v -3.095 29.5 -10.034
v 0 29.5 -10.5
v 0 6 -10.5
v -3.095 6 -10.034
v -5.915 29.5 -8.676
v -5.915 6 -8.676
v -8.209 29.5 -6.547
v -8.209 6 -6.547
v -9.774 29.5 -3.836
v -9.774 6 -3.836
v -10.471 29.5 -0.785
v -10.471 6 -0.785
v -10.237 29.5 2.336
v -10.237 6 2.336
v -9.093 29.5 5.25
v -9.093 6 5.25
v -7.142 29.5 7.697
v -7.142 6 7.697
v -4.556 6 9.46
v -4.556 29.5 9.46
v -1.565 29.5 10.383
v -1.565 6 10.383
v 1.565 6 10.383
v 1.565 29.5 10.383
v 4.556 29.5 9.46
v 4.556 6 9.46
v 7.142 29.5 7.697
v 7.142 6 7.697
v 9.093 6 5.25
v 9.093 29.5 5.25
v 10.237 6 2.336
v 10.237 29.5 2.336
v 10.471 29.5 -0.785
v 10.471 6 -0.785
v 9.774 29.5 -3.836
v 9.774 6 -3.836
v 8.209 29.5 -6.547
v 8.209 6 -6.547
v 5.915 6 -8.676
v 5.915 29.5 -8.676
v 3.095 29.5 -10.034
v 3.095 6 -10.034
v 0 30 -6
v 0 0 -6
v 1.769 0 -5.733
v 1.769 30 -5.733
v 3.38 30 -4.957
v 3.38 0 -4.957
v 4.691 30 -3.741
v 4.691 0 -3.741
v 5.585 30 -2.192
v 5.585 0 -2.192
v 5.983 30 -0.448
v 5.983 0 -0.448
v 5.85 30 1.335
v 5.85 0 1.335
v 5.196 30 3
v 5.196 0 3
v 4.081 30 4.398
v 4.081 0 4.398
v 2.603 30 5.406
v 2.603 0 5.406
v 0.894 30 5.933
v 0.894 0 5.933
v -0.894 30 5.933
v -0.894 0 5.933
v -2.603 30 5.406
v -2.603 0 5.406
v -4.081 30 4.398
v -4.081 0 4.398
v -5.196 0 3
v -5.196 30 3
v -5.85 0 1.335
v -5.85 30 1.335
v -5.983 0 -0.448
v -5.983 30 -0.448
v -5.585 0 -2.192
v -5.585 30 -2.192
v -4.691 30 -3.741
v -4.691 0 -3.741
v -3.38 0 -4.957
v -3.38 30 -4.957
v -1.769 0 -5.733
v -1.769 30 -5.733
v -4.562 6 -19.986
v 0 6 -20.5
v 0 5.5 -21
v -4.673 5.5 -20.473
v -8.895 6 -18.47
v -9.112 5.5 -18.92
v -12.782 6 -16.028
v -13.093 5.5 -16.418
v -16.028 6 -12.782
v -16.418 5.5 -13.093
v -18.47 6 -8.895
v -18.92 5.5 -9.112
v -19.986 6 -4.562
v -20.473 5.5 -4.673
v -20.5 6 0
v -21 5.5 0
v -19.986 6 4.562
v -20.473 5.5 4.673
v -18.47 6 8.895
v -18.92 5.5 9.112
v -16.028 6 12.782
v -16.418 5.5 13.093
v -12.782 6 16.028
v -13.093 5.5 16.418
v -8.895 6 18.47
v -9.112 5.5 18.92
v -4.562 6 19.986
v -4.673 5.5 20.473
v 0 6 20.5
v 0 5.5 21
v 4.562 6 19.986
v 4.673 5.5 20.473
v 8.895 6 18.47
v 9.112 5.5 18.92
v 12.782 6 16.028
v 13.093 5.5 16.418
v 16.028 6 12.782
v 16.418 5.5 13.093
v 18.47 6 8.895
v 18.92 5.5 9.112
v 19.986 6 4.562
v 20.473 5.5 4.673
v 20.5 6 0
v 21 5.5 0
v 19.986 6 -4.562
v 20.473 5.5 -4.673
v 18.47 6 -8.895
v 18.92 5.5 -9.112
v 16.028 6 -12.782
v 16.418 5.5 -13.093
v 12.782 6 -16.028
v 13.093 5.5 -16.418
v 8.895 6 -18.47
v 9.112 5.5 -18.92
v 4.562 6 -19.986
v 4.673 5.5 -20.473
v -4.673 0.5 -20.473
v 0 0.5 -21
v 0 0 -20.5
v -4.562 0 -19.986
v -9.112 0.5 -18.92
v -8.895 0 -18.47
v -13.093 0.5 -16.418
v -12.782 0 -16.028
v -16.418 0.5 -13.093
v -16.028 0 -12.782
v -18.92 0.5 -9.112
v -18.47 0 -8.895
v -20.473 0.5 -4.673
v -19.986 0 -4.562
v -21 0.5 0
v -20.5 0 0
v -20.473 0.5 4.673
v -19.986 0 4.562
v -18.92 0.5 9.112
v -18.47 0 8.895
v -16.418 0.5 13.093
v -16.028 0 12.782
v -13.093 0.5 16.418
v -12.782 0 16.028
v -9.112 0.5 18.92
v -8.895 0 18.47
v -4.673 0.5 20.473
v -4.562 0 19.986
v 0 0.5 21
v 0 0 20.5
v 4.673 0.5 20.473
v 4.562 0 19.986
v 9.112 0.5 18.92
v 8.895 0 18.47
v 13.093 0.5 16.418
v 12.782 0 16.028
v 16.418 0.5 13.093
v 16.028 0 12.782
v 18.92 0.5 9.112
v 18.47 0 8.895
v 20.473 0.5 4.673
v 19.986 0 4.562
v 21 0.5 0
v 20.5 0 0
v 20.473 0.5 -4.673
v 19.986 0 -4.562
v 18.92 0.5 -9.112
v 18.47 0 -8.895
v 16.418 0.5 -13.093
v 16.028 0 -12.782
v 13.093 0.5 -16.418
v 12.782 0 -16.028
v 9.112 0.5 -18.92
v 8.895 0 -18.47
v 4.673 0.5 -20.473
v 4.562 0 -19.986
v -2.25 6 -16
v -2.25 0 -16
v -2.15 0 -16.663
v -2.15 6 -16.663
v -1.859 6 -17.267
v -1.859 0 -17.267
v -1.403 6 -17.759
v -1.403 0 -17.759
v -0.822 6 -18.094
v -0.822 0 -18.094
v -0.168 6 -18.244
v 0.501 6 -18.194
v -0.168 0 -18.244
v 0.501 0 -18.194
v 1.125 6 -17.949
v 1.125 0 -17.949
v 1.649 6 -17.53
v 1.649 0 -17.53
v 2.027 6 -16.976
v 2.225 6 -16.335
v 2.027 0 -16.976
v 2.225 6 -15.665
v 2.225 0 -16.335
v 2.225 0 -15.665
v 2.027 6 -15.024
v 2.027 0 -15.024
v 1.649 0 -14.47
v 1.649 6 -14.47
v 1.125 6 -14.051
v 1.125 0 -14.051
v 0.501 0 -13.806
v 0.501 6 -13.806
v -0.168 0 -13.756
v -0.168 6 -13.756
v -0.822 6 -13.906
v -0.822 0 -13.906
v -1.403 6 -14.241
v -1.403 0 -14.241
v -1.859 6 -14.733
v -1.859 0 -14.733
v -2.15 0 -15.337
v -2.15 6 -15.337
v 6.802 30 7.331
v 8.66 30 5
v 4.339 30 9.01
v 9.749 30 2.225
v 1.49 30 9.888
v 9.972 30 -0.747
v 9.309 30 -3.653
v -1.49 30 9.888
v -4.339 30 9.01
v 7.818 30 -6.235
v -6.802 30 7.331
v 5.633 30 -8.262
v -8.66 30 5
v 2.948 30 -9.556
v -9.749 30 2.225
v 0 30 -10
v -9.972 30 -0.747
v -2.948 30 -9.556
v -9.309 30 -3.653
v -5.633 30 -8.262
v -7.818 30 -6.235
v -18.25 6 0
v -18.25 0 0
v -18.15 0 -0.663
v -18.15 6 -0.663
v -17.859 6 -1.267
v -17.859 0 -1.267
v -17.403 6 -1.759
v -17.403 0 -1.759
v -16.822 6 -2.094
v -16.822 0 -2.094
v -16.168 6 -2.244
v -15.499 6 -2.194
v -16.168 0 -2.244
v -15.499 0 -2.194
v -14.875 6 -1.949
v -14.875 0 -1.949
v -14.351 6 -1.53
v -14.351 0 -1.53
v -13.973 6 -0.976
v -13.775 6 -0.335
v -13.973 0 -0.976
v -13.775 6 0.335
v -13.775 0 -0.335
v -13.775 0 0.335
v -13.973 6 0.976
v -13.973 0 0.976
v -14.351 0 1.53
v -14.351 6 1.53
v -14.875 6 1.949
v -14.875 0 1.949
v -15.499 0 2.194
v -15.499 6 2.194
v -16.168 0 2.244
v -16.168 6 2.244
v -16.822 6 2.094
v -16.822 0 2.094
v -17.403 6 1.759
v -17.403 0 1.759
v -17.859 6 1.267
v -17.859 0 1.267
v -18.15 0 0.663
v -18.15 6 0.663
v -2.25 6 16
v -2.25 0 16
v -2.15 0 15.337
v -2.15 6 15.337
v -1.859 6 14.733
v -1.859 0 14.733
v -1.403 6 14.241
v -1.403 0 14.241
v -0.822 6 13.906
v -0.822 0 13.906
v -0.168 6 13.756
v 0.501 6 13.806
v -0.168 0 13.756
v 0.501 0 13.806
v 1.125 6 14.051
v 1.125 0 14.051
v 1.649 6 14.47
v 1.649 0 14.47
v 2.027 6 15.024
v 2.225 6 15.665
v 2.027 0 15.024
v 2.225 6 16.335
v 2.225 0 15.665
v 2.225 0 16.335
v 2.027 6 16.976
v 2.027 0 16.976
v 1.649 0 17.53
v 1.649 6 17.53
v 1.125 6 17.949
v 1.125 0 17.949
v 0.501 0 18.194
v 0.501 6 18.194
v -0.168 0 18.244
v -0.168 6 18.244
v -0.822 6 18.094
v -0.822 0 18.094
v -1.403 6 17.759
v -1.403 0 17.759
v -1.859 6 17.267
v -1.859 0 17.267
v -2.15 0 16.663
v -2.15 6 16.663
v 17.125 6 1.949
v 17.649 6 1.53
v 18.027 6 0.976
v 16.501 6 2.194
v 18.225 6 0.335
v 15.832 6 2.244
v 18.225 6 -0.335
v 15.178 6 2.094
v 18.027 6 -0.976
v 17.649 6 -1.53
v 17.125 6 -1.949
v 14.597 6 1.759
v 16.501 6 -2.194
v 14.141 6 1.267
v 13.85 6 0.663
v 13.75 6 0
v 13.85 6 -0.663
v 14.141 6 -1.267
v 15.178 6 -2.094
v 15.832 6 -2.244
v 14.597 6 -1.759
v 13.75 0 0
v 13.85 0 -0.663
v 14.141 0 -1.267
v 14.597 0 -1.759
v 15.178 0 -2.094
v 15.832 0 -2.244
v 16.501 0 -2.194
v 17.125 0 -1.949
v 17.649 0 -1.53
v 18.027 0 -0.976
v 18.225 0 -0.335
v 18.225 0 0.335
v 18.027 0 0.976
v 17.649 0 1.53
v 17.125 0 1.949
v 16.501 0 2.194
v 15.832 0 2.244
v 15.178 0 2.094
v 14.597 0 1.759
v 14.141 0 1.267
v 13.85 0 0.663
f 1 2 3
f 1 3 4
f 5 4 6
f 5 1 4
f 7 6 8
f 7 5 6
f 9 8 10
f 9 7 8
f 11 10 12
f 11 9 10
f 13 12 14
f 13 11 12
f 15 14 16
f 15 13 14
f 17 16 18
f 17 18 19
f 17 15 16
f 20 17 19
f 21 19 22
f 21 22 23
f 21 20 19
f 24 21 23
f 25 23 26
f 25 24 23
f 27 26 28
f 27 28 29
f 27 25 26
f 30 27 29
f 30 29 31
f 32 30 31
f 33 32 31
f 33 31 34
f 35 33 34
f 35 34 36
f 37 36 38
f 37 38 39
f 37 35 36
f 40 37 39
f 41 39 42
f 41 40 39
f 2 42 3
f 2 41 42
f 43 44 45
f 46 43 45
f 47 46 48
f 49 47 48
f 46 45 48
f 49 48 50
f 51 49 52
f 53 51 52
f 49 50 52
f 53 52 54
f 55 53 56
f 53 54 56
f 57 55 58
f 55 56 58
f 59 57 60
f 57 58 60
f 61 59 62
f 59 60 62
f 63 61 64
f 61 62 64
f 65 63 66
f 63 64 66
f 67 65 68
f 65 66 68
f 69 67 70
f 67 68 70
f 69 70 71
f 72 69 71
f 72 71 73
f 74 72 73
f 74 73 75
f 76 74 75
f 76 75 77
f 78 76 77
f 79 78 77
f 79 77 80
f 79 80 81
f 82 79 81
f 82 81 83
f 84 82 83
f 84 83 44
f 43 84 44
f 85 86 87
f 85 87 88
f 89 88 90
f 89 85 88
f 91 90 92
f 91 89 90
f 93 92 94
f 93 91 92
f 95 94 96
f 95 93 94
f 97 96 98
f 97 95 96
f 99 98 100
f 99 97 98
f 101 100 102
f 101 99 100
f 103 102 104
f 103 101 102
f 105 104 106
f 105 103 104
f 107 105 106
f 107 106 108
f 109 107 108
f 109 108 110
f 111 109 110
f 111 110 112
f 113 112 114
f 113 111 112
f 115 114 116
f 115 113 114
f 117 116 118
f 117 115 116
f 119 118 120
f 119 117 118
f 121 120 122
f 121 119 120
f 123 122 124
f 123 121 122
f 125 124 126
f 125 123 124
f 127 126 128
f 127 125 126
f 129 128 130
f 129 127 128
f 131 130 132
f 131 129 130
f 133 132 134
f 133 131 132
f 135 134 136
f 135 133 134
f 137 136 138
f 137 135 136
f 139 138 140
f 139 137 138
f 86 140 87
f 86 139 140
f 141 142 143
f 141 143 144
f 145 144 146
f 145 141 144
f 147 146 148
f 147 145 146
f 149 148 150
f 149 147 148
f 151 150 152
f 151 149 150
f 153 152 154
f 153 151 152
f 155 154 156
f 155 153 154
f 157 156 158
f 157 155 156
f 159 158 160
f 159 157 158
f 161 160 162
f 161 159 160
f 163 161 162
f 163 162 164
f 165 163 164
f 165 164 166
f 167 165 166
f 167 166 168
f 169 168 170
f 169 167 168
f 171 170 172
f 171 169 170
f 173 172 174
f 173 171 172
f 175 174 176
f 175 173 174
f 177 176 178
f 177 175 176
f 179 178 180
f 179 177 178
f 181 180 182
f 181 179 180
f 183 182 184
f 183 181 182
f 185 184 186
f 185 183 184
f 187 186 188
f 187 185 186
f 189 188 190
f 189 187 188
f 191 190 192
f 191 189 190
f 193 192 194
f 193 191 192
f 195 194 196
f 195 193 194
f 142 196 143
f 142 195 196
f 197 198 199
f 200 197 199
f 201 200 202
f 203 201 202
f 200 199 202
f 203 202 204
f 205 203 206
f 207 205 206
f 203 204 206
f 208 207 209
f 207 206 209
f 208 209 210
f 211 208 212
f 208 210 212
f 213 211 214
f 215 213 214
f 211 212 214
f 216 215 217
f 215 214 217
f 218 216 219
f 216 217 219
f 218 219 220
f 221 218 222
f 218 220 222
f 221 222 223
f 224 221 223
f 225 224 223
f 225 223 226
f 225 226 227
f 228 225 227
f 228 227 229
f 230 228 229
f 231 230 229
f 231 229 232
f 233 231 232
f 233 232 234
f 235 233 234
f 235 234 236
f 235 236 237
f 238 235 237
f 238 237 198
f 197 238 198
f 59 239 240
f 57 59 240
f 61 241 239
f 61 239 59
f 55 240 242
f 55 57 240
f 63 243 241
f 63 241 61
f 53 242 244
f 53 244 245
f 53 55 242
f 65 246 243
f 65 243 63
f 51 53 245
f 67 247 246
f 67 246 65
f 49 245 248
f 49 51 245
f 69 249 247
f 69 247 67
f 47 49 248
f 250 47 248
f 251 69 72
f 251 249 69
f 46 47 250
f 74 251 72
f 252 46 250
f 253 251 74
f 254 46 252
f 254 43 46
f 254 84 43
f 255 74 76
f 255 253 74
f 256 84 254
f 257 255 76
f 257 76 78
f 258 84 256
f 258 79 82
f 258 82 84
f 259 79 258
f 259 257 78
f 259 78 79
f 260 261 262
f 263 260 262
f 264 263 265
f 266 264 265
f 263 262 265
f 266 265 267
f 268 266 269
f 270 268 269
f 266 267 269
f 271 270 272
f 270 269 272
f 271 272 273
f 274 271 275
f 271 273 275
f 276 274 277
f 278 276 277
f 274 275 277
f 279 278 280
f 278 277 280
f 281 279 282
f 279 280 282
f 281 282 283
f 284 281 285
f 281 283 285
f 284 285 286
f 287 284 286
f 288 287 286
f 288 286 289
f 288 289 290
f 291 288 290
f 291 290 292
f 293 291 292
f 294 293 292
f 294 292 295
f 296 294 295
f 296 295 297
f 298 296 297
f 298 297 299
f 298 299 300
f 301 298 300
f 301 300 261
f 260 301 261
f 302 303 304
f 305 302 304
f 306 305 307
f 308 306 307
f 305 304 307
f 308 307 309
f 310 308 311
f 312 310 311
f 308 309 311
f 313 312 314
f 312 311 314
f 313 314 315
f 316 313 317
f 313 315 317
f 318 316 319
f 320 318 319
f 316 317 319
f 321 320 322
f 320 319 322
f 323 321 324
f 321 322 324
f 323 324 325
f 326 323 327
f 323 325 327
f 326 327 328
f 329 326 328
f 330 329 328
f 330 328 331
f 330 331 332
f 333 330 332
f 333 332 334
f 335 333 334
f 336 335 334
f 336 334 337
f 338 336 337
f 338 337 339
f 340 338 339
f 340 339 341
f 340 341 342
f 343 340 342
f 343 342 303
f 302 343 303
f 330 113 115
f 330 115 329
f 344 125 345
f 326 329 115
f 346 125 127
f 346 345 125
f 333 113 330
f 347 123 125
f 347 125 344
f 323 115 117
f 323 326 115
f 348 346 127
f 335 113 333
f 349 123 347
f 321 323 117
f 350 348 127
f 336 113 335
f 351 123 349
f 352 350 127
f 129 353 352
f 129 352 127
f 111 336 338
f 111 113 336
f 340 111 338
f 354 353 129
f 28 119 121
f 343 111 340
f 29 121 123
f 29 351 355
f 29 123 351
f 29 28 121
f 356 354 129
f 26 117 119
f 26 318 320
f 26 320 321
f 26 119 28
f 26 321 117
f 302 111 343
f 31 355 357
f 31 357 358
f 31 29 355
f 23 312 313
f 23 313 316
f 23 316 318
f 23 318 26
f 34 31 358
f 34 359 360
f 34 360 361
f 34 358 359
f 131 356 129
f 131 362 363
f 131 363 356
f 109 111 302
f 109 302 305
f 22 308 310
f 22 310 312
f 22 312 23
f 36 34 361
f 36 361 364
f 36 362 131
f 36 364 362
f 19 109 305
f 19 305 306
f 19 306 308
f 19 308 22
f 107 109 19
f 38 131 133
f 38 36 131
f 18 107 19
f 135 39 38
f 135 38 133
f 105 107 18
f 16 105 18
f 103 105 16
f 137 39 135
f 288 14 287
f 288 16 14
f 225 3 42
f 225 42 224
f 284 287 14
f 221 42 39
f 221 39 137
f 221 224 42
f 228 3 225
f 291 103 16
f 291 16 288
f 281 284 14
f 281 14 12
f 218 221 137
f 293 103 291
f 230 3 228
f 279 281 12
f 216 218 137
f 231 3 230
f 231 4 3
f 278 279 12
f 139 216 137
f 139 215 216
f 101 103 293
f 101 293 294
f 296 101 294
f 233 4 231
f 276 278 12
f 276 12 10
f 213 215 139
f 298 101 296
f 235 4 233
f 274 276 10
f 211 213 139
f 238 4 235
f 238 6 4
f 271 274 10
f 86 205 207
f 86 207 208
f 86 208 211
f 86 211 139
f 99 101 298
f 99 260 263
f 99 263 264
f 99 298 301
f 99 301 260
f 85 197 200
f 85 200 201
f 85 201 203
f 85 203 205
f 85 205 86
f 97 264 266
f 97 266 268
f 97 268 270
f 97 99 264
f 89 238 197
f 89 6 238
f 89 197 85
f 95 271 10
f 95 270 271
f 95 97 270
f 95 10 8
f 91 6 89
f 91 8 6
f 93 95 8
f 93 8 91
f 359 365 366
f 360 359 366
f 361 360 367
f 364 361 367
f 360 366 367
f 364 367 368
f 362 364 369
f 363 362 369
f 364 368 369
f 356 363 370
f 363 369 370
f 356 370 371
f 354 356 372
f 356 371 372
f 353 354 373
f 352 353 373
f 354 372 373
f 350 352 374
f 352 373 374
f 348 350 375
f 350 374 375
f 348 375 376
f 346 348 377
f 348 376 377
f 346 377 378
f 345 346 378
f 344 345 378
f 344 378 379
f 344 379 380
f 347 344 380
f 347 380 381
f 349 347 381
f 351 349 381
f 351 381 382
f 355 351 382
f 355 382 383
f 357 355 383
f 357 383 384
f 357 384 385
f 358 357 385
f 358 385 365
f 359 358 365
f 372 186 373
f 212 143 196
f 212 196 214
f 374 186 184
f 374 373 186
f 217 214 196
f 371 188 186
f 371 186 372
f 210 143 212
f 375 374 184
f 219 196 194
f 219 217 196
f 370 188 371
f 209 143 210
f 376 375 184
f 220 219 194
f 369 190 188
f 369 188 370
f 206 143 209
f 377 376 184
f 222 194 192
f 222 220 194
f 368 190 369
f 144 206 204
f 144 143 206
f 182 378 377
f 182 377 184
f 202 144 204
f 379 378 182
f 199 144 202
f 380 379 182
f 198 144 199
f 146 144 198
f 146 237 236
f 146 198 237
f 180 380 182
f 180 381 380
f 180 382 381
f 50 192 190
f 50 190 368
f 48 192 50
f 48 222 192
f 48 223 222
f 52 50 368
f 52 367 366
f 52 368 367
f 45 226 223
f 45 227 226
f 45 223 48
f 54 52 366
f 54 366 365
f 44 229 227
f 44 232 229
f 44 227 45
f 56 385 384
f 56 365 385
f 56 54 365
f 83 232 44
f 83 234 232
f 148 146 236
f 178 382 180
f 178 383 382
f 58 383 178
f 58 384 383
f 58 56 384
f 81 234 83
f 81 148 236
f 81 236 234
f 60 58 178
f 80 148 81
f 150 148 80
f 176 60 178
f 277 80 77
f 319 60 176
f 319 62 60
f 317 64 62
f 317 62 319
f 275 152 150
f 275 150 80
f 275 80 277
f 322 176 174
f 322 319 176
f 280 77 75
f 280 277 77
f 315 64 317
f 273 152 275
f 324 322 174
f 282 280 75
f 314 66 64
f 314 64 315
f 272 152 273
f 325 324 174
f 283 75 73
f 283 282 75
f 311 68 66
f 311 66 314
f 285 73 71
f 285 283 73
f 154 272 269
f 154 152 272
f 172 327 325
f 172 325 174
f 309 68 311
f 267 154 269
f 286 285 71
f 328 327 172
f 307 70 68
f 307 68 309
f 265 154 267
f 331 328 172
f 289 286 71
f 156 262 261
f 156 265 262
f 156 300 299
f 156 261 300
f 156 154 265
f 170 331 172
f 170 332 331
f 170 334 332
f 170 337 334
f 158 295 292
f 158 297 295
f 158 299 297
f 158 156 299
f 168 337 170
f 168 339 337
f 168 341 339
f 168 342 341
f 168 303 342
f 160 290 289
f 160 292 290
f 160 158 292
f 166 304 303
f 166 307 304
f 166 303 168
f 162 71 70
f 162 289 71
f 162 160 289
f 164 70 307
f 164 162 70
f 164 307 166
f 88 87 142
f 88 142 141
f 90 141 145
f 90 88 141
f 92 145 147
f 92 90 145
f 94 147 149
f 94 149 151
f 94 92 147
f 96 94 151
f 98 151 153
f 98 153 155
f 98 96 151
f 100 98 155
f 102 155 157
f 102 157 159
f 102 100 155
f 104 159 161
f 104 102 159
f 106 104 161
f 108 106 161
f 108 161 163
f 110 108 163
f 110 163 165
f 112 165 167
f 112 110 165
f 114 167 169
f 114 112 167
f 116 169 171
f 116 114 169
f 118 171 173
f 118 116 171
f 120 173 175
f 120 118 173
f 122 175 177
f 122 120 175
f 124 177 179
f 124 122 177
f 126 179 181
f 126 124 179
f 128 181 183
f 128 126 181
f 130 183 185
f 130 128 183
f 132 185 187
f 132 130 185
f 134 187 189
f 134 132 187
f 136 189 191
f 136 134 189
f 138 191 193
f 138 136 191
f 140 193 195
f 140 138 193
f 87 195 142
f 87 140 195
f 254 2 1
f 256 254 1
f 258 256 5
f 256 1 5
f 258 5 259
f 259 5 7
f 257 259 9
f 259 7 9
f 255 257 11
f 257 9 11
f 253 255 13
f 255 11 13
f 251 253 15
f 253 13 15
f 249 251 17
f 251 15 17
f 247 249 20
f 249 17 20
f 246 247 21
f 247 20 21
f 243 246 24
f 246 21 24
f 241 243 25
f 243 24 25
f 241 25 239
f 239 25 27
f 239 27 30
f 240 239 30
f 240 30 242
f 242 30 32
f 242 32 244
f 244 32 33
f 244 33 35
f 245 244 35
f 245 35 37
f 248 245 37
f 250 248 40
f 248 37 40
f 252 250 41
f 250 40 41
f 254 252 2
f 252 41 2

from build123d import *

# Parameters (mm, degrees)
SKETCH2_R             = 6
CUT_EXTRUDE1_DEPTH    = 43.213741838
HOLE_WIZARD_M41_D     = 4.5
HOLE_WIZARD_M41_DEPTH = 22
HOLE_WIZARD_M41_TIP   = 1.351936393
CHAMFER1_SIZE         = 0.5


with BuildPart() as part:
    # Sketch1 → Revolve1 (revolve)
    with BuildSketch(Plane.XY, mode=Mode.PRIVATE) as revolve1_sk:
        Polygon((0, 0), (-21, 0), (-21, 6), (-10.5, 6), (-10.5, 30), (0, 30), align=None)
    revolve(revolve1_sk.sketch.rotate(Axis((0, 0, 0), (0, 1, 0)), 270), axis=Axis((0, 0, 0), (0, 1, 0)))

    # Sketch2 → Cut-Extrude1 (cut, through all)
    with BuildSketch(Plane.XZ):
        with Locations(Location((0, 0, 0), (0, 0, 270))):
            Circle(SKETCH2_R)
    extrude(amount=-CUT_EXTRUDE1_DEPTH, mode=Mode.SUBTRACT)

    # Отверстие с зазором M41
    with Locations(Plane(origin=(0, 6, 0), x_dir=(1, 0, 0), z_dir=(0, 1, 0))):
        with Locations((0, 16), (16, 0), (0, -16), (-16, 0)):
            Hole(HOLE_WIZARD_M41_D / 2, depth=HOLE_WIZARD_M41_DEPTH)
            with Locations((0, 0, -(HOLE_WIZARD_M41_DEPTH + HOLE_WIZARD_M41_TIP / 2))):  # 118° drill point
                Cone(0, HOLE_WIZARD_M41_D / 2, HOLE_WIZARD_M41_TIP, mode=Mode.SUBTRACT)

    # Chamfer1
    chamfer1_edges = [part.edges().sort_by_distance(p)[0] for p in [
        (0, 30, 10.5),
        (0, 6, 21),
        (0, 0, 21),
    ]]
    chamfer(chamfer1_edges, length=CHAMFER1_SIZE)


solid = part.part
